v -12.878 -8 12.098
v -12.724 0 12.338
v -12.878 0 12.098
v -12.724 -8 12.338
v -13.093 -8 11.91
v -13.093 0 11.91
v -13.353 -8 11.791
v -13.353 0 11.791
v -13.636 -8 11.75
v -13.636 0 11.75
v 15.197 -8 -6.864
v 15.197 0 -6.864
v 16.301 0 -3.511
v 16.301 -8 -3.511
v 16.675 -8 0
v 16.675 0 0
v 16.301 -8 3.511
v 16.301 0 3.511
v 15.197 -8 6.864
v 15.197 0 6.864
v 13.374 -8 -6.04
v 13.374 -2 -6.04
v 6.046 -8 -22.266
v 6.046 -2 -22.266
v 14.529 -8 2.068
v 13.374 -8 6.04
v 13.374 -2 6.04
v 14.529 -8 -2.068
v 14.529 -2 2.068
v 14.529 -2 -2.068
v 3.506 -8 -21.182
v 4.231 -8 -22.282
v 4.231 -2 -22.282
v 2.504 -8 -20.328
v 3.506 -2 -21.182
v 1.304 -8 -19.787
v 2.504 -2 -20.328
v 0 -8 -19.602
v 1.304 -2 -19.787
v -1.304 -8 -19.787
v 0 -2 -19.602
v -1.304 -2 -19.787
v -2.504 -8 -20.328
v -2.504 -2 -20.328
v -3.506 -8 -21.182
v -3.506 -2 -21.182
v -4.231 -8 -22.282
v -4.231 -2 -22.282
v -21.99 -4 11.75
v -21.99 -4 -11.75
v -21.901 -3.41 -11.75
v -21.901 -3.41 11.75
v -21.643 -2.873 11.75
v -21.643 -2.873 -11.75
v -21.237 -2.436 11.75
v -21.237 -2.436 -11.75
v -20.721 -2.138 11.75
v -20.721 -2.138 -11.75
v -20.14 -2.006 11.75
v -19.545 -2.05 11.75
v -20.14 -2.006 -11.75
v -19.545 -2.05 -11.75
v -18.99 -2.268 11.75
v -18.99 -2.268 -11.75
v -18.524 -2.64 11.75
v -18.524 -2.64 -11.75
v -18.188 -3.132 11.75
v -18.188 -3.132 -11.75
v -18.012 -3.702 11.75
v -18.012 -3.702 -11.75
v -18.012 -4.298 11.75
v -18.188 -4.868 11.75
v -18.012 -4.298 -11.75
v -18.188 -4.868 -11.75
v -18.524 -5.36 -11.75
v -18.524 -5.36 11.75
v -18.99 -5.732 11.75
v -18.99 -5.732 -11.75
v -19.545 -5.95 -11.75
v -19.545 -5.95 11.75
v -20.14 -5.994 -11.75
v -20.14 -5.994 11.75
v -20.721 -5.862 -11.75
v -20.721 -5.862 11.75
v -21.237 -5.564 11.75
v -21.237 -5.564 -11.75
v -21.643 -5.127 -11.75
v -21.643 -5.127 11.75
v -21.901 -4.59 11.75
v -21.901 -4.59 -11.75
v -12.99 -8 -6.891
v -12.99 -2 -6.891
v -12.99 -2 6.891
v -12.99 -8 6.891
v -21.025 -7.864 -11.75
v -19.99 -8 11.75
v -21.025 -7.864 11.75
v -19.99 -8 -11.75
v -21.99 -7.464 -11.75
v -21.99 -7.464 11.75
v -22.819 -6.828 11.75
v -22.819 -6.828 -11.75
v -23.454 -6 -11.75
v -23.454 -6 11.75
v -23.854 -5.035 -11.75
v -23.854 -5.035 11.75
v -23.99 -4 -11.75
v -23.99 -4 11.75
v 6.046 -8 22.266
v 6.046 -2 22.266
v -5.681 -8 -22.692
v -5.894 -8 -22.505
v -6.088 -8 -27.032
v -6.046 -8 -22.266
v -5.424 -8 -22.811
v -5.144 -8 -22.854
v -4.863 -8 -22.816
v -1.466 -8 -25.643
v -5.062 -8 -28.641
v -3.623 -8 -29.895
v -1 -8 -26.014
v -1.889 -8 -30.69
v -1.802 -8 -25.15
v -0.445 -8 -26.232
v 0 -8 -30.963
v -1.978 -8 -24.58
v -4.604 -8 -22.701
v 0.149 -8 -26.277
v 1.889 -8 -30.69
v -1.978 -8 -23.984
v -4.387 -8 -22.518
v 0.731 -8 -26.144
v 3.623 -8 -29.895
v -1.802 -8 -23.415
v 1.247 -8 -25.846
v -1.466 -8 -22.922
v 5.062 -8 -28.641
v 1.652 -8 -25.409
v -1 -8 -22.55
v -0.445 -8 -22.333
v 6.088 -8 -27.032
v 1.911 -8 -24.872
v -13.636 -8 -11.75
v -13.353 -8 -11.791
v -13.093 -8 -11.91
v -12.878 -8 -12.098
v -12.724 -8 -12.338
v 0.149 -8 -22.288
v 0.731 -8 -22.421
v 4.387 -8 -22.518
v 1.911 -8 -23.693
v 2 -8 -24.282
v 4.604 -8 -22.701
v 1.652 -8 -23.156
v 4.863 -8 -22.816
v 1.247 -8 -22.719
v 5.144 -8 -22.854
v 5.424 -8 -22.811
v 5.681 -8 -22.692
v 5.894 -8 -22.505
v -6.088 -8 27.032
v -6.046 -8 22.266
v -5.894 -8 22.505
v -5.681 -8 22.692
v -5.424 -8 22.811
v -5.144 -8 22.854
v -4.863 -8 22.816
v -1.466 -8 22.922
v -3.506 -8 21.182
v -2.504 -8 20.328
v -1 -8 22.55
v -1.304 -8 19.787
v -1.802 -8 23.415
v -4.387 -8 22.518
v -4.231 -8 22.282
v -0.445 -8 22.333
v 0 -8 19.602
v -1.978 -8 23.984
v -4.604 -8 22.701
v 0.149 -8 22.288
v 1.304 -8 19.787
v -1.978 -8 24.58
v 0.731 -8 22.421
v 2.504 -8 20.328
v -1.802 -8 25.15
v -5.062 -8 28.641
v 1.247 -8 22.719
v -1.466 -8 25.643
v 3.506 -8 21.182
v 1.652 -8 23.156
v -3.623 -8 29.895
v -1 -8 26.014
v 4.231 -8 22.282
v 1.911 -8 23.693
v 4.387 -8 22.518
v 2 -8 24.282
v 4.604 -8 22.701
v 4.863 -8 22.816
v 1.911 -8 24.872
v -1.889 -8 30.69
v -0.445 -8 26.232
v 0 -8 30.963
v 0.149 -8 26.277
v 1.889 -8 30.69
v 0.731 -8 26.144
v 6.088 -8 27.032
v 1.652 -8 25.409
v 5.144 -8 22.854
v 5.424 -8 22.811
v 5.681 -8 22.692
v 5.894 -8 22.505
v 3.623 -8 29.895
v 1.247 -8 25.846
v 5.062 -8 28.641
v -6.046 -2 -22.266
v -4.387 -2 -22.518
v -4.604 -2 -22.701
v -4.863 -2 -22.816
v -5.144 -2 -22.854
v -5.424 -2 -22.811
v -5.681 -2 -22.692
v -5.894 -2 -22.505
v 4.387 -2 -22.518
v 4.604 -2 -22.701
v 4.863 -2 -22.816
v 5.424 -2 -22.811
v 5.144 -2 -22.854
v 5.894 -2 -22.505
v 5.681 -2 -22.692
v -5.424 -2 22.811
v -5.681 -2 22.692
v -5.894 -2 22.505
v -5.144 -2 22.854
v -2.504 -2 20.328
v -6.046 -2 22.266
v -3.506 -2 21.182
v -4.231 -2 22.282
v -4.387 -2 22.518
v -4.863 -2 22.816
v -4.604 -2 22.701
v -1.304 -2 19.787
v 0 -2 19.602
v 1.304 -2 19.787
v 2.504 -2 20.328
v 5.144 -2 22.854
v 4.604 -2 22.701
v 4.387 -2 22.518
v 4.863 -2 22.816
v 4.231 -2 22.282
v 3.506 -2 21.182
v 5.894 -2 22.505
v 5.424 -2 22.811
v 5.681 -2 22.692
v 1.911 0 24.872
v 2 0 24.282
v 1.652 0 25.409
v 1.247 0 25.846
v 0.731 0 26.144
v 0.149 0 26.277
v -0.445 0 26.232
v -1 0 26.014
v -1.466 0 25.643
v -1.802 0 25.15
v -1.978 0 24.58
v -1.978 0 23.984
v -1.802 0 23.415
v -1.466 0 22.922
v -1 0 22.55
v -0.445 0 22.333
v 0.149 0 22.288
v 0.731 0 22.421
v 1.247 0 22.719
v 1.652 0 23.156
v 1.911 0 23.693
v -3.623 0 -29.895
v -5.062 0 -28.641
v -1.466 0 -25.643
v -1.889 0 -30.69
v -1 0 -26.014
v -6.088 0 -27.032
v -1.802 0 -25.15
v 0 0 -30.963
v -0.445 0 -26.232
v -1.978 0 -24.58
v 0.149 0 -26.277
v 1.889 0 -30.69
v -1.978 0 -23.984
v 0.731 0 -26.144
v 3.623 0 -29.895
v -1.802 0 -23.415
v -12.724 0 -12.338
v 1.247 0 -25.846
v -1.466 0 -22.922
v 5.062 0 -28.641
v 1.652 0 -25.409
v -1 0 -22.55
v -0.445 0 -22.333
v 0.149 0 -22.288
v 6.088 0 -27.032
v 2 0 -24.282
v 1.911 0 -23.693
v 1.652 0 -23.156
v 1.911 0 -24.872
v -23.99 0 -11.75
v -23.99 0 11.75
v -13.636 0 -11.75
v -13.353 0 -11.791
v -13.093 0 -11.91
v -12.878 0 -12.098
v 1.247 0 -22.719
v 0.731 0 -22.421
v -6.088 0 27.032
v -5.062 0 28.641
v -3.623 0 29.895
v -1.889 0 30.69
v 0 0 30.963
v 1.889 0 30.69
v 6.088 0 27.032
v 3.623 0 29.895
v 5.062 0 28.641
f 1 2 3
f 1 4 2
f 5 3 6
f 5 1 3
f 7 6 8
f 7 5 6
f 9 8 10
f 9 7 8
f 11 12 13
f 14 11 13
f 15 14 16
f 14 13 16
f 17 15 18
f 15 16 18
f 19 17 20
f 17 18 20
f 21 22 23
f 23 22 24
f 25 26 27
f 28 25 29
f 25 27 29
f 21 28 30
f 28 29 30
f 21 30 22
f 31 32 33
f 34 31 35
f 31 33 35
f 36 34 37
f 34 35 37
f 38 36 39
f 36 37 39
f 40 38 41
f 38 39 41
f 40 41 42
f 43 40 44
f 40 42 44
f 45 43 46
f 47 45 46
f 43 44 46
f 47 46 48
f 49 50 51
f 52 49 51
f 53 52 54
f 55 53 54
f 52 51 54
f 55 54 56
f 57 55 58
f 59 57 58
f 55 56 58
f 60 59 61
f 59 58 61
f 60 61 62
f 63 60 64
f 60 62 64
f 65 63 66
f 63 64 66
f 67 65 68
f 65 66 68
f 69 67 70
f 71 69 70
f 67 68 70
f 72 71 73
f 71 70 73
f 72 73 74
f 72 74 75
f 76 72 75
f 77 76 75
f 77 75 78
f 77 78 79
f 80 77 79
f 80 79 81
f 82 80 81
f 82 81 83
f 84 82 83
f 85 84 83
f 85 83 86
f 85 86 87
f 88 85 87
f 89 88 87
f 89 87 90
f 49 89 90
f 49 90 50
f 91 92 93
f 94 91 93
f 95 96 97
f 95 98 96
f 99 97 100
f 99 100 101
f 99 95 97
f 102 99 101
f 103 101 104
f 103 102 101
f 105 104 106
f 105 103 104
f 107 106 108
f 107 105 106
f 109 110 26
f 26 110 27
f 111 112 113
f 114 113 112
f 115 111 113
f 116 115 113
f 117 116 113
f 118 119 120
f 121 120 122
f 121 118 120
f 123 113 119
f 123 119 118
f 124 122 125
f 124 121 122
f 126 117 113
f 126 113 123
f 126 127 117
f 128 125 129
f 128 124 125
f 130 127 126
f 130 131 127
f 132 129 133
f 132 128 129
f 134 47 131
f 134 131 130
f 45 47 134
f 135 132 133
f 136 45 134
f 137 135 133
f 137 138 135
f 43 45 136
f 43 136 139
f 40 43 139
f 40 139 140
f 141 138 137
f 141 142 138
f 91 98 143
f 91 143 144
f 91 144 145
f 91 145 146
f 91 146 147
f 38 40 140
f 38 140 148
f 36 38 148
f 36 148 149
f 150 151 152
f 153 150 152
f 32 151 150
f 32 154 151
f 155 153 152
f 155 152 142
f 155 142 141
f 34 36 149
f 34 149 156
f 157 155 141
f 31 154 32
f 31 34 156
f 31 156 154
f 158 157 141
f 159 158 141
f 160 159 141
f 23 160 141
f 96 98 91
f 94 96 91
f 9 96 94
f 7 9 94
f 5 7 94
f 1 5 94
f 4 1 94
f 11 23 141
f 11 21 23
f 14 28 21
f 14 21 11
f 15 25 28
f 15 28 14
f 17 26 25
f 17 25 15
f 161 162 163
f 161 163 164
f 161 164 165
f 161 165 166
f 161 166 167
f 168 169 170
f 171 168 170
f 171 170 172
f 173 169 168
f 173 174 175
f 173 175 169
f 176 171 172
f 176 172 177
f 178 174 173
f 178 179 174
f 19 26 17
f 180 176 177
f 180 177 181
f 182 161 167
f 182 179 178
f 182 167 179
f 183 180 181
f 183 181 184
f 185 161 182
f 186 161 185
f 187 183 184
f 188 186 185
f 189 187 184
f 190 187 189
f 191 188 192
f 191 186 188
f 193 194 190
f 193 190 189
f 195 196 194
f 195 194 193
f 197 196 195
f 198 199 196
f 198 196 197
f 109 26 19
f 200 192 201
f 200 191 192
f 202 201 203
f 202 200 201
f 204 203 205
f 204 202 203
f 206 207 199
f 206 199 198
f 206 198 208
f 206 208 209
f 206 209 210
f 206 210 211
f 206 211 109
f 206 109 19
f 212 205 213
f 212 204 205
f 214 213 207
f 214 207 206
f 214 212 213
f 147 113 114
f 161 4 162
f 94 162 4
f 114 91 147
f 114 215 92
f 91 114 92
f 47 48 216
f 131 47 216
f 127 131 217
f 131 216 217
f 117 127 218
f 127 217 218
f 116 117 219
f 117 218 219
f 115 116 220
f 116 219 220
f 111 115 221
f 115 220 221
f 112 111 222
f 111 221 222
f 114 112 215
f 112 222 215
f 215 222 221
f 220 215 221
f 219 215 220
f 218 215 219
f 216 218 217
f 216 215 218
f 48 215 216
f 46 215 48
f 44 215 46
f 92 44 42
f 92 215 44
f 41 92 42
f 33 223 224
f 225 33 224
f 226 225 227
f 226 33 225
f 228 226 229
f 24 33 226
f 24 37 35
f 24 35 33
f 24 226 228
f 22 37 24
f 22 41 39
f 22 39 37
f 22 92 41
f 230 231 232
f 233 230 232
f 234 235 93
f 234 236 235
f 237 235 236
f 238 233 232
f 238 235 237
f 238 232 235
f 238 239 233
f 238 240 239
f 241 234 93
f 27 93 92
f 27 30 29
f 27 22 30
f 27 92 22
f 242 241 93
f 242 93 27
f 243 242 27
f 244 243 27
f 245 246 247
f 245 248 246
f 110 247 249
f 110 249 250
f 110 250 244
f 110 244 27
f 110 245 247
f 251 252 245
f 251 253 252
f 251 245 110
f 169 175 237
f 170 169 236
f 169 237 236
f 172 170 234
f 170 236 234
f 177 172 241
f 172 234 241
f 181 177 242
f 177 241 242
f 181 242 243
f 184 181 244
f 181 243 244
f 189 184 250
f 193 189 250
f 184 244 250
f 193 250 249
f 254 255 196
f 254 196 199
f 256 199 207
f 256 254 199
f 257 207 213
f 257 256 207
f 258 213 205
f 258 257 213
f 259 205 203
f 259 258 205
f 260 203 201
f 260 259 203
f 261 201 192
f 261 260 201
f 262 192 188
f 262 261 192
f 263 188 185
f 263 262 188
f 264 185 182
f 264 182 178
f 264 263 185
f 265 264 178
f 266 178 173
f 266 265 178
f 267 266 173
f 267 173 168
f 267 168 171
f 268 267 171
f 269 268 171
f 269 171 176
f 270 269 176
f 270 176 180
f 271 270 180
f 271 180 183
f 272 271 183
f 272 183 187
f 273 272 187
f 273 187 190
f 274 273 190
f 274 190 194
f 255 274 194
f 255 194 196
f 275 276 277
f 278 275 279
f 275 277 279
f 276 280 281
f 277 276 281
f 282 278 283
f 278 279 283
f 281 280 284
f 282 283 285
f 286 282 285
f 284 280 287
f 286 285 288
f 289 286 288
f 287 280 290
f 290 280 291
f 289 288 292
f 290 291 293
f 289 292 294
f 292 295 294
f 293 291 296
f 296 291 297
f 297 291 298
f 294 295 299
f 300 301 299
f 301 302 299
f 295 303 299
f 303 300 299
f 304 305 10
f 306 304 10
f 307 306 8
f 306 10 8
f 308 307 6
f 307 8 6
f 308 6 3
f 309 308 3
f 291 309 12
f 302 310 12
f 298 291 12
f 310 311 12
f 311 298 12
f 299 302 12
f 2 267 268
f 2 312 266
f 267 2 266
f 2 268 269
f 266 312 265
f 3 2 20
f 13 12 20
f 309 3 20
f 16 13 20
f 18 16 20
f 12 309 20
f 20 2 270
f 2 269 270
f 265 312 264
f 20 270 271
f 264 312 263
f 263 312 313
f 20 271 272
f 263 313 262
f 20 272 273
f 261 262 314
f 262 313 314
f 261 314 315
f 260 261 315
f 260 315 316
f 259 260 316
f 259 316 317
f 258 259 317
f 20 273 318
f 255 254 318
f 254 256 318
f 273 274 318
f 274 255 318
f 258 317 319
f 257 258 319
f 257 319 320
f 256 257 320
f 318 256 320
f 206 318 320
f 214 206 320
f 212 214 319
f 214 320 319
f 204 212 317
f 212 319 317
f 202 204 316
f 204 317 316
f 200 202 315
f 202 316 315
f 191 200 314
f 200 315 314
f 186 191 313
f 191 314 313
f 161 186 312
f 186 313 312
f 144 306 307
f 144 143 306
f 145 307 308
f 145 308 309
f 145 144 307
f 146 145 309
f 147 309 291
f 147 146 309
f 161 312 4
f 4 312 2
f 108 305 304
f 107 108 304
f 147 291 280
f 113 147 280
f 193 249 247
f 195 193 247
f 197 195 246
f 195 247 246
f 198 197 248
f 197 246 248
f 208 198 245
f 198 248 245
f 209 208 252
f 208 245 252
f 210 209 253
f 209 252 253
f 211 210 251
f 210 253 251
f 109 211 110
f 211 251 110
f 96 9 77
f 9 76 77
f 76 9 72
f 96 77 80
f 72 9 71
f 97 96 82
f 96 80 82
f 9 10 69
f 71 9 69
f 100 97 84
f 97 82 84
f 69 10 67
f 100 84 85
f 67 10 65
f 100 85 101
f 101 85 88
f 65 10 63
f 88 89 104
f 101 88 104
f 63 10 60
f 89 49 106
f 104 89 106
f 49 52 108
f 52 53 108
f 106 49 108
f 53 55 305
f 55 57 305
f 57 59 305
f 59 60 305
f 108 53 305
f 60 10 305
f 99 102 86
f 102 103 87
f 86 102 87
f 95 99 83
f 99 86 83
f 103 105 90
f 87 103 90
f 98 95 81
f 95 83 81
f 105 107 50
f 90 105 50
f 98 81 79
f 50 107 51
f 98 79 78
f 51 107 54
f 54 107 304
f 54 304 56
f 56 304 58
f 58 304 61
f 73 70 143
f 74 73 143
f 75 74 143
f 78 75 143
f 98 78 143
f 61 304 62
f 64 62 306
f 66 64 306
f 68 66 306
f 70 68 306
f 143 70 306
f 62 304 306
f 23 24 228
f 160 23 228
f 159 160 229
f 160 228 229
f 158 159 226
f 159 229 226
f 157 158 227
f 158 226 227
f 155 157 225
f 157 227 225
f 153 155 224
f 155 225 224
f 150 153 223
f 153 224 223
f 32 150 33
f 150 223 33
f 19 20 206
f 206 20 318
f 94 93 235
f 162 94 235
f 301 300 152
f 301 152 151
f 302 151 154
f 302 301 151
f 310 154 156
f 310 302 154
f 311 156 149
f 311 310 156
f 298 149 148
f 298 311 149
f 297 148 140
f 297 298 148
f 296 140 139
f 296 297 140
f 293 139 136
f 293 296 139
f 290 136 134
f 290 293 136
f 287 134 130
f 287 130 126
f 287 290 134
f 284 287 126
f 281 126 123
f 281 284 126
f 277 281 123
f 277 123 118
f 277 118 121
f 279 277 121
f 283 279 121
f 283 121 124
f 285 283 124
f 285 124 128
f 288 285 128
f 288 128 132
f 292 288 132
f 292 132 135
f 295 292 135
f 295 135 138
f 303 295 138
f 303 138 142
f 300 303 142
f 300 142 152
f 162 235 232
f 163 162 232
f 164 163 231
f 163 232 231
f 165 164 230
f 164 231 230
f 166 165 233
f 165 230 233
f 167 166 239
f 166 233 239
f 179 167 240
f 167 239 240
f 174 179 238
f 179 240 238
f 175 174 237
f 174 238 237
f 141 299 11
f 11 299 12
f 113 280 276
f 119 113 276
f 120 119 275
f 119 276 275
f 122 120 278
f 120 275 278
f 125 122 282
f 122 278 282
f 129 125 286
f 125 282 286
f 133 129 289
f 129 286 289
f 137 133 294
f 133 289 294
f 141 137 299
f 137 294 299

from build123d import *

# Parameters (mm, degrees)
F0_R     = 2
F1_DEPTH = 8
F2_DEPTH = 2
F3_R     = 1
F5_D     = 4
F6_R     = 4


# Not quite as in the source:
# - a feature names something its author has since deleted; it is built from what else it names


with BuildPart() as f1:
    # F0 (on Front) → F1 (new body)
    with BuildSketch(Plane.XZ):
        with BuildLine():
            Line((15.1970139668, 6.8636525628), (6.0880650012, 27.0320429916))
            ThreePointArc((6.0880650012, 27.0320429916), (0, 30.9626), (-6.0880650012, 27.0320429916))
            Line((-6.0880650012, 27.0320429916), (-12.9901204821, 11.75))
            Line((-12.9901204821, 11.75), (-12.9901204821, 6.8910419314))
            Line((-12.9901204821, 6.8910419314), (-6.0462846285, 22.2655920687))
            ThreePointArc((-6.0462846285, 22.2655920687), (-5.1436901116, 22.8539427752), (-4.2309206889, 22.2815046593))
            ThreePointArc((-4.2309206889, 22.2815046593), (0, 19.6022), (4.2309206889, 22.2815046593))
            ThreePointArc((4.2309206889, 22.2815046593), (5.1436901116, 22.8539427752), (6.0462846285, 22.2655920687))
            Line((6.0462846285, 22.2655920687), (13.3742945868, 6.0404308054))
            ThreePointArc((13.3742945868, 6.0404308054), (14.6751, 0), (13.3742945868, -6.0404308054))
            Line((13.3742945868, -6.0404308054), (6.0462846285, -22.2655920687))
            ThreePointArc((6.0462846285, -22.2655920687), (5.1436901116, -22.8539427752), (4.2309206889, -22.2815046593))
            ThreePointArc((4.2309206889, -22.2815046593), (0, -19.6022), (-4.2309206889, -22.2815046593))
            ThreePointArc((-4.2309206889, -22.2815046593), (-5.1436901116, -22.8539427752), (-6.0462846285, -22.2655920687))
            Line((-6.0462846285, -22.2655920687), (-12.9901204821, -6.8910419314))
            Line((-12.9901204821, -6.8910419314), (-12.9901204821, -11.75))
            Line((-12.9901204821, -11.75), (-6.0880650012, -27.0320429916))
            ThreePointArc((-6.0880650012, -27.0320429916), (0, -30.9626), (6.0880650012, -27.0320429916))
            Line((6.0880650012, -27.0320429916), (15.1970139668, -6.8636525628))
            ThreePointArc((15.1970139668, -6.8636525628), (16.6751, 0), (15.1970139668, 6.8636525628))
        make_face()
        with Locations((0, -24.2824)):
            Circle(F0_R, mode=Mode.SUBTRACT)
        with Locations((0, 24.2824)):
            Circle(F0_R, mode=Mode.SUBTRACT)
        Polygon((-12.9901204821, 6.8910419314), (-12.9901204821, 11.75), (-23.9901204821, 11.75), (-23.9901204821, -11.75), (-12.9901204821, -11.75), (-12.9901204821, -6.8910419314), align=None)
    extrude(amount=F1_DEPTH)

    # F0 (on Front) → F2 (join)
    with BuildSketch(Plane.XZ):
        with BuildLine():
            Line((-6.0462846285, 22.2655920687), (-12.9901204821, 6.8910419314))
            Line((-12.9901204821, 6.8910419314), (-12.9901204821, -6.8910419314))
            Line((-12.9901204821, -6.8910419314), (-6.0462846285, -22.2655920687))
            ThreePointArc((-6.0462846285, -22.2655920687), (-5.1436901116, -22.8539427752), (-4.2309206889, -22.2815046593))
            ThreePointArc((-4.2309206889, -22.2815046593), (0, -19.6022), (4.2309206889, -22.2815046593))
            ThreePointArc((4.2309206889, -22.2815046593), (5.1436901116, -22.8539427752), (6.0462846285, -22.2655920687))
            Line((6.0462846285, -22.2655920687), (13.3742945868, -6.0404308054))
            ThreePointArc((13.3742945868, -6.0404308054), (14.6751, 0), (13.3742945868, 6.0404308054))
            Line((13.3742945868, 6.0404308054), (6.0462846285, 22.2655920687))
            ThreePointArc((6.0462846285, 22.2655920687), (5.1436901116, 22.8539427752), (4.2309206889, 22.2815046593))
            ThreePointArc((4.2309206889, 22.2815046593), (0, 19.6022), (-4.2309206889, 22.2815046593))
            ThreePointArc((-4.2309206889, 22.2815046593), (-5.1436901116, 22.8539427752), (-6.0462846285, 22.2655920687))
        make_face()
        Polygon((-12.9901204821, 6.8910419314), (-12.9901204821, 11.75), (-23.9901204821, 11.75), (-23.9901204821, -11.75), (-12.9901204821, -11.75), (-12.9901204821, -6.8910419314), align=None)
        with BuildLine():
            Line((15.1970139668, 6.8636525628), (6.0880650012, 27.0320429916))
            ThreePointArc((6.0880650012, 27.0320429916), (0, 30.9626), (-6.0880650012, 27.0320429916))
            Line((-6.0880650012, 27.0320429916), (-12.9901204821, 11.75))
            Line((-12.9901204821, 11.75), (-12.9901204821, 6.8910419314))
            Line((-12.9901204821, 6.8910419314), (-6.0462846285, 22.2655920687))
            ThreePointArc((-6.0462846285, 22.2655920687), (-5.1436901116, 22.8539427752), (-4.2309206889, 22.2815046593))
            ThreePointArc((-4.2309206889, 22.2815046593), (0, 19.6022), (4.2309206889, 22.2815046593))
            ThreePointArc((4.2309206889, 22.2815046593), (5.1436901116, 22.8539427752), (6.0462846285, 22.2655920687))
            Line((6.0462846285, 22.2655920687), (13.3742945868, 6.0404308054))
            ThreePointArc((13.3742945868, 6.0404308054), (14.6751, 0), (13.3742945868, -6.0404308054))
            Line((13.3742945868, -6.0404308054), (6.0462846285, -22.2655920687))
            ThreePointArc((6.0462846285, -22.2655920687), (5.1436901116, -22.8539427752), (4.2309206889, -22.2815046593))
            ThreePointArc((4.2309206889, -22.2815046593), (0, -19.6022), (-4.2309206889, -22.2815046593))
            ThreePointArc((-4.2309206889, -22.2815046593), (-5.1436901116, -22.8539427752), (-6.0462846285, -22.2655920687))
            Line((-6.0462846285, -22.2655920687), (-12.9901204821, -6.8910419314))
            Line((-12.9901204821, -6.8910419314), (-12.9901204821, -11.75))
            Line((-12.9901204821, -11.75), (-6.0880650012, -27.0320429916))
            ThreePointArc((-6.0880650012, -27.0320429916), (0, -30.9626), (6.0880650012, -27.0320429916))
            Line((6.0880650012, -27.0320429916), (15.1970139668, -6.8636525628))
            ThreePointArc((15.1970139668, -6.8636525628), (16.6751, 0), (15.1970139668, 6.8636525628))
        make_face()
        with Locations((0, -24.2824)):
            Circle(F0_R, mode=Mode.SUBTRACT)
        with Locations((0, 24.2824)):
            Circle(F0_R, mode=Mode.SUBTRACT)
    extrude(amount=F2_DEPTH)

    # F3
    f3_edges = [f1.edges().sort_by_distance(p)[0] for p in [
        (-12.99012, -4, -11.75),
        (-12.99012, -4, 11.75),
    ]]
    fillet(f3_edges, radius=F3_R)

    # F5 (through all)
    with Locations(Plane.XY.offset(11.75)):
        with Locations((-19.9901204821, -4)):
            Hole(F5_D / 2)

    # F6
    f6_edges = [f1.edges().sort_by_distance(p)[0] for p in [
        (-23.99012, -8, 0),
    ]]
    fillet(f6_edges, radius=F6_R)


solid = f1.part
